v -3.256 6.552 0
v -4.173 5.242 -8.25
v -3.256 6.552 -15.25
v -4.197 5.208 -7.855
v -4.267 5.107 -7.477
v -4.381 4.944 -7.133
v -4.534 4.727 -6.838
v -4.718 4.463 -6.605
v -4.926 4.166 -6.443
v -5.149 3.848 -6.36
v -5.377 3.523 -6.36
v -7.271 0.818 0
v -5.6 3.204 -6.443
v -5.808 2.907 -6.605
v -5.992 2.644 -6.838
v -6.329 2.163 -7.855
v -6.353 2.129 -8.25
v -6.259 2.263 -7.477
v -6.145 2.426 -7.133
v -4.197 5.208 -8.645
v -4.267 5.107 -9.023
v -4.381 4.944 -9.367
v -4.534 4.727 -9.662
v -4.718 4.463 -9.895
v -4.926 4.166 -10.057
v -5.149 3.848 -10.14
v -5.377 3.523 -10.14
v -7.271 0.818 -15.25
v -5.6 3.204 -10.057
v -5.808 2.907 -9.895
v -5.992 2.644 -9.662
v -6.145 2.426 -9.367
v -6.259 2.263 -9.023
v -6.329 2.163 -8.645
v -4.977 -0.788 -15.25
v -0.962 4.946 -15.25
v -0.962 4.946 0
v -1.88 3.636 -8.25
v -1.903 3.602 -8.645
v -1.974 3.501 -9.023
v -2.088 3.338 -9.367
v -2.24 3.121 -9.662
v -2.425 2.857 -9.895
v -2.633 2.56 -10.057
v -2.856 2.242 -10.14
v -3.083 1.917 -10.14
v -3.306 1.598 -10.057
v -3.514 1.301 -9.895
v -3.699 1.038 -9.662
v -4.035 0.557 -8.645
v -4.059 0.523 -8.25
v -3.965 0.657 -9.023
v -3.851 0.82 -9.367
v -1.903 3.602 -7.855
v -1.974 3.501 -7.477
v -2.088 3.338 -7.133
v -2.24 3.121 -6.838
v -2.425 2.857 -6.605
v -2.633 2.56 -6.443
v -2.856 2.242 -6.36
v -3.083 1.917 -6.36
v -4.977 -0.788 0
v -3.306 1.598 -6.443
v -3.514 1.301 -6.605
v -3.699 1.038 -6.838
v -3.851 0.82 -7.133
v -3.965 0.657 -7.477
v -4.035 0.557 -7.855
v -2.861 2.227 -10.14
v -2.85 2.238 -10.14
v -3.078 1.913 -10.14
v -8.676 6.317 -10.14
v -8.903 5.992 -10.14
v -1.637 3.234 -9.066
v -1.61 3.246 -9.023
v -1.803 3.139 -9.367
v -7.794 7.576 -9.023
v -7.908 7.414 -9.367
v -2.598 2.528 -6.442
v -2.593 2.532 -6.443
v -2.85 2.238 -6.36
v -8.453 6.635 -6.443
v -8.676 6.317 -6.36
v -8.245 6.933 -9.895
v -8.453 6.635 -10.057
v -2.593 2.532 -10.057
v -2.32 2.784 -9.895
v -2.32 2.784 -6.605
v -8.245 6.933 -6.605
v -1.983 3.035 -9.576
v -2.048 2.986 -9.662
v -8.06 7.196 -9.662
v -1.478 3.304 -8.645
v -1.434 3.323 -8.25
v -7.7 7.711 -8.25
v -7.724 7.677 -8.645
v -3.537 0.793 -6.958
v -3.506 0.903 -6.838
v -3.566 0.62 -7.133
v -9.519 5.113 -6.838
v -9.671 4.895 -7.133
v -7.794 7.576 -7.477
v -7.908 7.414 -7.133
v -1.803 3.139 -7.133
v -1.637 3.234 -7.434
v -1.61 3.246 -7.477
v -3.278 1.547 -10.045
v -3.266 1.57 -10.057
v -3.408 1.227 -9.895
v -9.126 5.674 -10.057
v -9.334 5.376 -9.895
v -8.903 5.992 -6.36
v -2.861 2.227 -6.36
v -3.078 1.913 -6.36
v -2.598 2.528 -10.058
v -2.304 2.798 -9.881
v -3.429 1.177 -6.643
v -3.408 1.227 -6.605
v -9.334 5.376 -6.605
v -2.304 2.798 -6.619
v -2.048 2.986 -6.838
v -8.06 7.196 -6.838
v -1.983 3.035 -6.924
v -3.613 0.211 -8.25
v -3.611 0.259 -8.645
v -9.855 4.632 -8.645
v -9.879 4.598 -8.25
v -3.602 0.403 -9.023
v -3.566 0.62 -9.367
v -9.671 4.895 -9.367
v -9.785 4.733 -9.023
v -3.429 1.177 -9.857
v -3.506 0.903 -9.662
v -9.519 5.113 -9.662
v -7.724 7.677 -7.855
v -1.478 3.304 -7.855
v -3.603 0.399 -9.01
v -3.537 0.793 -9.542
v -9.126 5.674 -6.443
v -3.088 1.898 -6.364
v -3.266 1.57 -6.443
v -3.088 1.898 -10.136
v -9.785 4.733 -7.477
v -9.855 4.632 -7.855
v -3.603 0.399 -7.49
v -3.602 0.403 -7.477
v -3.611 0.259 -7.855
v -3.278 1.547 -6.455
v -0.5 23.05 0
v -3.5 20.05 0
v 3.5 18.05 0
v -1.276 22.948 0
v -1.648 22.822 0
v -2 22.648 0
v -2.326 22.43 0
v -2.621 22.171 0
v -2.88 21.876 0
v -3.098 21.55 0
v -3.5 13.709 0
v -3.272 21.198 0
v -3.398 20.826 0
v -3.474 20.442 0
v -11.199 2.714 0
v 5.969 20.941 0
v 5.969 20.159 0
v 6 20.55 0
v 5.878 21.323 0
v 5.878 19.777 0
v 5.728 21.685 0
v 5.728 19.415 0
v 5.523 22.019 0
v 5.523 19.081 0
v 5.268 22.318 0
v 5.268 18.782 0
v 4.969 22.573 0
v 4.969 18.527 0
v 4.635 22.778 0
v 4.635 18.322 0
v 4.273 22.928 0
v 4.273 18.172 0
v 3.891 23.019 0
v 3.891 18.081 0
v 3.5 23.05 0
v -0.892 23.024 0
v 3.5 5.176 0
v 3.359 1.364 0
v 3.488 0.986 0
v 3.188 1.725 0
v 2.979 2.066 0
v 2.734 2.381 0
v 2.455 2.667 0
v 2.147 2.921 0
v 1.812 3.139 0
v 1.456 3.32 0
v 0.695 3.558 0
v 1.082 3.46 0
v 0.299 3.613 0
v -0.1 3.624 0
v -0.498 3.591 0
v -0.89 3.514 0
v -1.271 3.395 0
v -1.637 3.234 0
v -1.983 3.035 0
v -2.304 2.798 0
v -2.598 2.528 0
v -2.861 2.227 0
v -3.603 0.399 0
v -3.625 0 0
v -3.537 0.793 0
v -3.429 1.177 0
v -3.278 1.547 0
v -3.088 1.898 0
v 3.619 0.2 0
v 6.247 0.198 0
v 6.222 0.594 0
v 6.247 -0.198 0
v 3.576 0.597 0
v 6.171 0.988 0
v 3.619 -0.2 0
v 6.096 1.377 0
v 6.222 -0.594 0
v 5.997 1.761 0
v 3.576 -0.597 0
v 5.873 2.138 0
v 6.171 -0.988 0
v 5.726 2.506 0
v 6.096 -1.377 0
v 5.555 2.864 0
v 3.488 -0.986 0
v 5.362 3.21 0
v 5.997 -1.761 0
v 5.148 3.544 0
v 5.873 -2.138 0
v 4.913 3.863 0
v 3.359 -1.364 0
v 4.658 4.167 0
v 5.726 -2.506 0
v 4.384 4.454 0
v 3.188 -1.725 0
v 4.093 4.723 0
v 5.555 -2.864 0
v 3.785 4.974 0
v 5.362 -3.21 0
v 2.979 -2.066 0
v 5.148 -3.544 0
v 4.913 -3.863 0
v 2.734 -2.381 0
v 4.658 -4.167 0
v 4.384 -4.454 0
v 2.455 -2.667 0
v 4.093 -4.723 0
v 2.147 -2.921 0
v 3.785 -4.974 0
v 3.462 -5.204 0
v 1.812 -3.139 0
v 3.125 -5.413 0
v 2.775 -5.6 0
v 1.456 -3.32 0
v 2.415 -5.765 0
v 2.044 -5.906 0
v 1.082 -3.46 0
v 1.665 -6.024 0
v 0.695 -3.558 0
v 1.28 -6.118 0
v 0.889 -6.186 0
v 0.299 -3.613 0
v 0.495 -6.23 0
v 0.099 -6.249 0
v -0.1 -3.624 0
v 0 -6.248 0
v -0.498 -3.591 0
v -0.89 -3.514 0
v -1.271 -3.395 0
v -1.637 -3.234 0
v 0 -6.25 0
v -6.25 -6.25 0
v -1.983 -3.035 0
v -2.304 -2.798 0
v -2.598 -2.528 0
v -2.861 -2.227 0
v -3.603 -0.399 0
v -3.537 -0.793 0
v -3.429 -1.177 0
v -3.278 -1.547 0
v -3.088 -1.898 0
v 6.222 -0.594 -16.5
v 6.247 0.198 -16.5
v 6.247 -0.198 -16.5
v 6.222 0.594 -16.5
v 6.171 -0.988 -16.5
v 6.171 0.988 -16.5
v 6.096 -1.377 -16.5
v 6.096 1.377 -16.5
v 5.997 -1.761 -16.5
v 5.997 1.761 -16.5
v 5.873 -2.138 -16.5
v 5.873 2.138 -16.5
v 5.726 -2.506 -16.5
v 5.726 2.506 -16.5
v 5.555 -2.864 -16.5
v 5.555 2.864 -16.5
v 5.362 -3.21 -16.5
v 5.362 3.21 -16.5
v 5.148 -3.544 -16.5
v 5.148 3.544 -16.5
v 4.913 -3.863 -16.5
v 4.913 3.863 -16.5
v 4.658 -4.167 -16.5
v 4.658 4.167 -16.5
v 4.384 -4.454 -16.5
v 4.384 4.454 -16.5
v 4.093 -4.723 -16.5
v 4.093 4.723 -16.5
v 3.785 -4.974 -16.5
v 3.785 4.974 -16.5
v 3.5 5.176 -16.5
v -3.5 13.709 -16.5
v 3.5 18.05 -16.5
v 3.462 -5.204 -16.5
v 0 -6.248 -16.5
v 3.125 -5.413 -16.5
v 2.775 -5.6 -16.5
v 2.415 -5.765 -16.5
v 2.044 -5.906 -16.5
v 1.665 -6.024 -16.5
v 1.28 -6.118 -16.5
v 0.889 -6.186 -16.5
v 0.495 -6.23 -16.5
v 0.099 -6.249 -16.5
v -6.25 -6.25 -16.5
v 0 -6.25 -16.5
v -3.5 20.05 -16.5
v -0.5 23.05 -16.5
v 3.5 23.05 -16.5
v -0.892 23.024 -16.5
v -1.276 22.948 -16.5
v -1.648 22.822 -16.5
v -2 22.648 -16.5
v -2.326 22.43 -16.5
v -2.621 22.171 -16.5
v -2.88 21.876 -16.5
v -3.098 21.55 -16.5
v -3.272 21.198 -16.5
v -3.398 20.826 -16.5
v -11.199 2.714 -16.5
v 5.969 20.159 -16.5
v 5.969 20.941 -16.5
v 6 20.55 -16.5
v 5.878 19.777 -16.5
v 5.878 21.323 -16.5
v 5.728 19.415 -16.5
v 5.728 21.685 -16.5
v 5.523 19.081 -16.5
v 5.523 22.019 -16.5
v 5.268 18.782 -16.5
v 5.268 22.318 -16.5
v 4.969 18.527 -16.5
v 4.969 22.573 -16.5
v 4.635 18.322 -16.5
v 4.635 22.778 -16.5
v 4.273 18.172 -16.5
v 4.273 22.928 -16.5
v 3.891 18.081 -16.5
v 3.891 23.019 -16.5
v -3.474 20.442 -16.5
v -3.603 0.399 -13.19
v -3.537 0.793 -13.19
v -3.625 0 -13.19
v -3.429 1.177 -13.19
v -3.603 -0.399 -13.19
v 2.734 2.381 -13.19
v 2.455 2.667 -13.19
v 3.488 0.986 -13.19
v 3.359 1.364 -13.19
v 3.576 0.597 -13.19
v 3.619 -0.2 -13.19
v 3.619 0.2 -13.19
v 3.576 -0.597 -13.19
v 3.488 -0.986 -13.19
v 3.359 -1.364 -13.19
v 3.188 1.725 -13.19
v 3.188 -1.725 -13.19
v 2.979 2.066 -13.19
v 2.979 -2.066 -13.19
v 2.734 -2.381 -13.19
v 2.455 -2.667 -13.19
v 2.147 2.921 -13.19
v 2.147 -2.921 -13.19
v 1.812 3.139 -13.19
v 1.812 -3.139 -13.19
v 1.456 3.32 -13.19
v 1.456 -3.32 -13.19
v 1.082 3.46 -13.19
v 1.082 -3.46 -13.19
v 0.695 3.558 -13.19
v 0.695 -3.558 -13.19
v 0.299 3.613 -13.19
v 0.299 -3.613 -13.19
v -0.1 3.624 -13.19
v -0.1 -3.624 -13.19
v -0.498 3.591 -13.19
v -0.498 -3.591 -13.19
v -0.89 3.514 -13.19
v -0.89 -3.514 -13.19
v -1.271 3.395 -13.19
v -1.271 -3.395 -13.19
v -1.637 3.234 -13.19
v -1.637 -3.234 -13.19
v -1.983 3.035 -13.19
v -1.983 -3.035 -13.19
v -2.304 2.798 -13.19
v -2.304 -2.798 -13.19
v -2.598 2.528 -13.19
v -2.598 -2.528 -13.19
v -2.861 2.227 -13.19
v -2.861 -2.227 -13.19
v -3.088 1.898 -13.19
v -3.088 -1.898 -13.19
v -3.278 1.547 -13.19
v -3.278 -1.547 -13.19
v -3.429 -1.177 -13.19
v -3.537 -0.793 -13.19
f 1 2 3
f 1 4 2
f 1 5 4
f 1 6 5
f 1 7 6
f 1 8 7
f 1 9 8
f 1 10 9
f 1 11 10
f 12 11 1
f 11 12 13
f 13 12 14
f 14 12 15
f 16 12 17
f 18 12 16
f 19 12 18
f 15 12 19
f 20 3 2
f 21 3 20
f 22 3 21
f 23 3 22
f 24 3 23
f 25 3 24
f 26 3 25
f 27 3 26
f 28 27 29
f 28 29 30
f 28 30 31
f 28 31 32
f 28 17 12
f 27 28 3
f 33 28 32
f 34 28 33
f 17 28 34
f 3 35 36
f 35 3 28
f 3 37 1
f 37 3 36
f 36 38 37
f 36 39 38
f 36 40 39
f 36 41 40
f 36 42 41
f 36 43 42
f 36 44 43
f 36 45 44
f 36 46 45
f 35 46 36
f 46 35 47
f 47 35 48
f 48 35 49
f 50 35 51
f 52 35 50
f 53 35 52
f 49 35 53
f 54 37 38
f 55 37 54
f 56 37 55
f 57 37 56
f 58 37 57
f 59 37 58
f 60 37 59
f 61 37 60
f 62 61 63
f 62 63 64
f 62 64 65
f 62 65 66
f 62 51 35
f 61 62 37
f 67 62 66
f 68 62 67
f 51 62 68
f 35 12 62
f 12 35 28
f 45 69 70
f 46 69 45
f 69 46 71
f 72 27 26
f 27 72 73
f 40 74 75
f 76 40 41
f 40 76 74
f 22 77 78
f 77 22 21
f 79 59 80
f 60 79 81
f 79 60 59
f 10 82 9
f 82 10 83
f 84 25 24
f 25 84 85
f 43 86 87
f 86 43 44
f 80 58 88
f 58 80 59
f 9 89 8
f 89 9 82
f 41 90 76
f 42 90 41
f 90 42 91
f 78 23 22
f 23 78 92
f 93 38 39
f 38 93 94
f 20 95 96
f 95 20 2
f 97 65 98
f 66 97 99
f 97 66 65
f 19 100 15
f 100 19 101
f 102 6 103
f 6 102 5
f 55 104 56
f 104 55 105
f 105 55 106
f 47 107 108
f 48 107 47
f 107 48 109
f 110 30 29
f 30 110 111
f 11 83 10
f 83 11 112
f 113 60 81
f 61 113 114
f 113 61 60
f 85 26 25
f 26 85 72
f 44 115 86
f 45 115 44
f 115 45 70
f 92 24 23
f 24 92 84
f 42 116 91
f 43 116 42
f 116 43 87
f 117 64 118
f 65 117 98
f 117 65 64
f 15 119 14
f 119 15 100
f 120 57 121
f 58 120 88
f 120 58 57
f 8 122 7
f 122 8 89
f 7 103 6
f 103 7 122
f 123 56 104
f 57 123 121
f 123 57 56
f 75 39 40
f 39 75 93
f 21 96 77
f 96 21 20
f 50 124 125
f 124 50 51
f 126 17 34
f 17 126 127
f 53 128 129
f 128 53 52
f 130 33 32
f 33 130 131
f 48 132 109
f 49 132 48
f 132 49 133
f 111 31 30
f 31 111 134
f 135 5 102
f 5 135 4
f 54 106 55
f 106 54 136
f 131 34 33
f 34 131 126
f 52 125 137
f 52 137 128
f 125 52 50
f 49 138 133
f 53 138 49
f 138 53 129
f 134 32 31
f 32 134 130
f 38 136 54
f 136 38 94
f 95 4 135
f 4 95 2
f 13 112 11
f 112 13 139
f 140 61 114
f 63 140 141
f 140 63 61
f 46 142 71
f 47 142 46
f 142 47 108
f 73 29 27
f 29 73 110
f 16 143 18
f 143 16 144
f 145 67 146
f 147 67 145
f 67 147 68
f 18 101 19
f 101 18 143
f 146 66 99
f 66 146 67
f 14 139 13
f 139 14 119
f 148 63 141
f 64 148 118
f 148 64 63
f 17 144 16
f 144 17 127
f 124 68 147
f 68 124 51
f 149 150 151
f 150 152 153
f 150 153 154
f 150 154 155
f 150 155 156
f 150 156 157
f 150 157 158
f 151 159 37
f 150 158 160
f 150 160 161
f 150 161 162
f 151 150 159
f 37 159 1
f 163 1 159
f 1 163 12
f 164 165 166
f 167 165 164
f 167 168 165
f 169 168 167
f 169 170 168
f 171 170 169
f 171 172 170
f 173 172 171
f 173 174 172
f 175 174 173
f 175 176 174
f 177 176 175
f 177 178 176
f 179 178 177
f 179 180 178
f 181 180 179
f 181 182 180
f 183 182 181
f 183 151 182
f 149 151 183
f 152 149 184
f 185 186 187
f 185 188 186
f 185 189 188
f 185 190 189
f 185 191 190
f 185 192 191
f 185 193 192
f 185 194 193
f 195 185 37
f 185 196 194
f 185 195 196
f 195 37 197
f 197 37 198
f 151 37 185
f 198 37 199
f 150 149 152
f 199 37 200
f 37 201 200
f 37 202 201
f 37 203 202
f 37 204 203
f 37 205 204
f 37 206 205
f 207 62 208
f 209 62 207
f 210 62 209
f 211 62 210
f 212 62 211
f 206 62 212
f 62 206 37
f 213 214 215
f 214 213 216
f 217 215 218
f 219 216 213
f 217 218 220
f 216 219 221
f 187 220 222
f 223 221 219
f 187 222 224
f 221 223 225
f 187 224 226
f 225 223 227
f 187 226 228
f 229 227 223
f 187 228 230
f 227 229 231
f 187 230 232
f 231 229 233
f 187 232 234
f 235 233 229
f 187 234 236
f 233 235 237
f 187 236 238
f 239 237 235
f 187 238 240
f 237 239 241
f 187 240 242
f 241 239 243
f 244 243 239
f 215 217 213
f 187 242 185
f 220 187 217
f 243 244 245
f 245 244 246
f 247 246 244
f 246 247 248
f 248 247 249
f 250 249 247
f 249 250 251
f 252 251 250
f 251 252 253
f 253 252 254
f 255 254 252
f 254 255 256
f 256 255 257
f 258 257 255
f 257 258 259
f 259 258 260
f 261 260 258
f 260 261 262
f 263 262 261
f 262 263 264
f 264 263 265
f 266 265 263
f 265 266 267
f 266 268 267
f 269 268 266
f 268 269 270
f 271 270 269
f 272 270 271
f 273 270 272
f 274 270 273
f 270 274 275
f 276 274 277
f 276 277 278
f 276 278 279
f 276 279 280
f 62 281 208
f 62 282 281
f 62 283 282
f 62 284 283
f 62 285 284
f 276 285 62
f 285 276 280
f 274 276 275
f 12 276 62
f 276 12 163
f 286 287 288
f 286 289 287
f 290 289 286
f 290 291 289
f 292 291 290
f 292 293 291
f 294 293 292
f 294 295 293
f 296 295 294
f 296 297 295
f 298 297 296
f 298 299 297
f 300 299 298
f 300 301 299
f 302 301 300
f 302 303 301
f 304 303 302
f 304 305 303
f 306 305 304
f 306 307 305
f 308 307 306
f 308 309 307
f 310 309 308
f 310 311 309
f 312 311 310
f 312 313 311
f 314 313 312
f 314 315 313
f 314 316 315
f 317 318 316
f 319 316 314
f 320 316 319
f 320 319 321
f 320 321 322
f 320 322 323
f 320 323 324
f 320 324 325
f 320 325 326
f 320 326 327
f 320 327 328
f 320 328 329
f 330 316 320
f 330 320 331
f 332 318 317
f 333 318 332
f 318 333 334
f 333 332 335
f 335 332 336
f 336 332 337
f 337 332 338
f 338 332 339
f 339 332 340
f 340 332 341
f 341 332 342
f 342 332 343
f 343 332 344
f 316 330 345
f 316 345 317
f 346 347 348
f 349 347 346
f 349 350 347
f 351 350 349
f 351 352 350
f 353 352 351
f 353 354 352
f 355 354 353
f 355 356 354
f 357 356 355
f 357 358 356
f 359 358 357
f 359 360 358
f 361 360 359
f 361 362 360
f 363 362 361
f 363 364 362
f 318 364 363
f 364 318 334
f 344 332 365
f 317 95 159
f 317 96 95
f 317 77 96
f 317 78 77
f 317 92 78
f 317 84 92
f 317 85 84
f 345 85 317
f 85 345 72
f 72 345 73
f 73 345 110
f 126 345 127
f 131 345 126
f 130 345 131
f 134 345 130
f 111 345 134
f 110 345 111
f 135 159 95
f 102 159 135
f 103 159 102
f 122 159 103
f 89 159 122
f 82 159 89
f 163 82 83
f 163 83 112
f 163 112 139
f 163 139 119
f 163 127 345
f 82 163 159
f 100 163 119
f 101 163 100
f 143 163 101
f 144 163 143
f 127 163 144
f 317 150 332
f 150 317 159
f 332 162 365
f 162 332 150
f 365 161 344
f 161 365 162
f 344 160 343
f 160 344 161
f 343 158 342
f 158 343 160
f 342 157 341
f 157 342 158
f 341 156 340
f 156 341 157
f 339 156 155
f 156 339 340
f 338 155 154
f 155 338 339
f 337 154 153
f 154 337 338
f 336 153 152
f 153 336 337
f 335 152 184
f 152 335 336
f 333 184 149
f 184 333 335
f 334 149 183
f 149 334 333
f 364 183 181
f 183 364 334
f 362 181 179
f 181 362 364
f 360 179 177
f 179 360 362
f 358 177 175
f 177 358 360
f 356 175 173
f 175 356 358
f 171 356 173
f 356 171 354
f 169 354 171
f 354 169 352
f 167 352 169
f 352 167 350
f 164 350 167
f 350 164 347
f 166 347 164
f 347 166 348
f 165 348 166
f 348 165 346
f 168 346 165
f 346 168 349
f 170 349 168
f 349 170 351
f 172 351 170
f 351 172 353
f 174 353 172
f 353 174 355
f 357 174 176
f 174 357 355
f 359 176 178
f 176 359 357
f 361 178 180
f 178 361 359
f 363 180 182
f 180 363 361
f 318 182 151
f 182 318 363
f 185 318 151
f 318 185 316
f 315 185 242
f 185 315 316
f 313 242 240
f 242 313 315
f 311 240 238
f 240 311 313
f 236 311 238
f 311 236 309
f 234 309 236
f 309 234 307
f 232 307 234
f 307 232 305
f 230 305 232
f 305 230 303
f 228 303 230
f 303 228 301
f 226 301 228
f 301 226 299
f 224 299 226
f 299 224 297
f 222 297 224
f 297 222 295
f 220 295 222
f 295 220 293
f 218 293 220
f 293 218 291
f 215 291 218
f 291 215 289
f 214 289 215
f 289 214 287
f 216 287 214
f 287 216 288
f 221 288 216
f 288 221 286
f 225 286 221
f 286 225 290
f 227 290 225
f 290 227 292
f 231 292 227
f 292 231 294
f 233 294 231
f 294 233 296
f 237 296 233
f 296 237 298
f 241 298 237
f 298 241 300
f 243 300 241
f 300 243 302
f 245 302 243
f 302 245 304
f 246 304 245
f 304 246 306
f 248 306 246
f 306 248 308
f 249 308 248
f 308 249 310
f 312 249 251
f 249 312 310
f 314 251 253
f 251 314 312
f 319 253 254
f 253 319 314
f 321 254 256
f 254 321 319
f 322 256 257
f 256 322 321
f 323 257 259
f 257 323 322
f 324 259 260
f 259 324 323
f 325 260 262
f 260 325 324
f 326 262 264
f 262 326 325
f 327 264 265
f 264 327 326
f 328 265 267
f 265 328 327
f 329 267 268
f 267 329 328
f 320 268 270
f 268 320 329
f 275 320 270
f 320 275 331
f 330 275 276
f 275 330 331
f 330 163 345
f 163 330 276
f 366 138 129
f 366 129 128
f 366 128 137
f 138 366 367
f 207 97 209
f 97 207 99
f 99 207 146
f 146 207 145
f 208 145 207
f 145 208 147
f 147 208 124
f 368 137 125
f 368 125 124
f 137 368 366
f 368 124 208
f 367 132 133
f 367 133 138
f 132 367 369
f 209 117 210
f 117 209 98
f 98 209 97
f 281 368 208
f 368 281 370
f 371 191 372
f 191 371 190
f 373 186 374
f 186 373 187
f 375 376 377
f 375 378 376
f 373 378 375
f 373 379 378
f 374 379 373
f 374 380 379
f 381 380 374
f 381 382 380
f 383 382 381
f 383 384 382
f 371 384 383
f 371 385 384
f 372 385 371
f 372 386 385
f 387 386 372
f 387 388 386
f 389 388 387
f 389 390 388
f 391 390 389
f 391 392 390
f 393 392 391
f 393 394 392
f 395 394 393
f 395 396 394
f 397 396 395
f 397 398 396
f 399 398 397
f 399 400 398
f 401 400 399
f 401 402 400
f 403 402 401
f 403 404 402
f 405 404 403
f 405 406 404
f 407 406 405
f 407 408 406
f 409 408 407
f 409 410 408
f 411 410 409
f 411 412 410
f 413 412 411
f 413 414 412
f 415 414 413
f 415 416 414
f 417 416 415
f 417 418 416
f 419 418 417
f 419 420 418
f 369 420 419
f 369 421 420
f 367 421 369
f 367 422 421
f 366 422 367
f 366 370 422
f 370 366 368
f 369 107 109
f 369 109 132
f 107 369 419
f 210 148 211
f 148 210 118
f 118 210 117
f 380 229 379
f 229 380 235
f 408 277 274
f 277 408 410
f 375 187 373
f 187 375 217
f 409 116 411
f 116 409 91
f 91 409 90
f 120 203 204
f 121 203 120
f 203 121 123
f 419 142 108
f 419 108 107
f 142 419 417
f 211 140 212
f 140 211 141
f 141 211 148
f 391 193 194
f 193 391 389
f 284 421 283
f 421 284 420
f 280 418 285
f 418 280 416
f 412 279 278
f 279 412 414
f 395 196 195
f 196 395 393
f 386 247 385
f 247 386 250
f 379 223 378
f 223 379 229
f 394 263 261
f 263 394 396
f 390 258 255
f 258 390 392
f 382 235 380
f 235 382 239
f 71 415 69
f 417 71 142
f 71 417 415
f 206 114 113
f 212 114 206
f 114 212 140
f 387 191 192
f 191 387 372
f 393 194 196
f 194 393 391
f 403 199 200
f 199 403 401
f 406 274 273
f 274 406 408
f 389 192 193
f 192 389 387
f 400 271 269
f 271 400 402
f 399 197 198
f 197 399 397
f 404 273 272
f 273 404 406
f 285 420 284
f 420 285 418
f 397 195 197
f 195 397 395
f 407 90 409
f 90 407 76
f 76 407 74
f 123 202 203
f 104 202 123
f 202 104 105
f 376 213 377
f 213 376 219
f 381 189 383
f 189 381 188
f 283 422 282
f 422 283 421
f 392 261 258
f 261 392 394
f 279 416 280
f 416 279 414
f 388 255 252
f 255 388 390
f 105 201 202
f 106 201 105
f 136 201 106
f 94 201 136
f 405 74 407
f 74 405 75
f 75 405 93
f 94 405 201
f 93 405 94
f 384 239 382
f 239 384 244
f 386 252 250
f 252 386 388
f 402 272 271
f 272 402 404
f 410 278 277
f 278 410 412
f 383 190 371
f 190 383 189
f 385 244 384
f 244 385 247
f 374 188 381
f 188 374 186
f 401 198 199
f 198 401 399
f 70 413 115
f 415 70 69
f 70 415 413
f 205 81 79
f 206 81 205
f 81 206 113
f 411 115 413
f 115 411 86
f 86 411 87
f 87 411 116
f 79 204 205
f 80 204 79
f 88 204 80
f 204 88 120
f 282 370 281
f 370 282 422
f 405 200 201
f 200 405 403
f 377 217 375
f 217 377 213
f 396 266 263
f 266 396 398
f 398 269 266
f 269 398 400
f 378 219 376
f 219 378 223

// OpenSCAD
$fa = 1;
$fs = 0.4;

diametro = 12.5;
radio1 = 3;
radio2 = 2.5;
largo = 29.3;
alto = 16.5;
ancho = 7;

d_vastago = 6.35 + .9;
a_vastago = 13.2;

d_tornillo = 3.8;
a_tornillo = 9;
l_tuerca = 7;
a_tuerca = 2.8;

alfa = 55;

//off = (diametro+d_vastago)/4;
off = d_vastago/2+a_tuerca/2;

module base () {
  circle(d=diametro);
  translate([-ancho/2,0,0]){  
    hull() {      
      square(ancho);
      translate([ancho-radio1,largo-radio1-diametro/2,0])
        circle(radio1);
      translate([0,largo-ancho/2-diametro/2,0])
        square(ancho/2);
    }
    translate([0,largo-radio2-diametro/2,0])
      circle(radio2);    
  }
  hull(){
    rotate([0,0,-alfa])
      translate([-l_tuerca*1.4,diametro/2-a_tuerca,0])
        square([2*l_tuerca,2.6*a_tuerca],center=false);
    translate([0,-diametro/2,0])
      square([diametro/2,diametro/2]);
  }
}

module tuerca(){
  difference(){
    cube([l_tuerca,l_tuerca,a_tuerca], center=true);
    translate([0,0,-a_tuerca])
      cylinder(h=3*a_tuerca,d=d_tornillo);
  }
}

module tornillo(){
  cylinder(h=a_tornillo,d=d_tornillo);
  translate([0,0,a_tornillo])
    difference(){
      sphere(r=d_tornillo);
      translate([0,0,-d_tornillo])
        cube(d_tornillo*2,center=true);
  }
}

module manija(){
  difference() {
    linear_extrude(alto) base();
    translate([0,0,-.01])
      cylinder(h=a_vastago, d=d_vastago);    
    for (s=[-1])
      rotate([0,0,s*alfa]) {
        // tuercas
        rotate([0,0,90])
          translate([off, 0, l_tuerca])
            rotate([0,90,0])
              cube([alto,l_tuerca,a_tuerca],center=true);
        // tornillos
        translate([0,0,alto/2])
          rotate([90,0,180])
            cylinder(h=diametro,d=d_tornillo);
      }
  }
}

//base();
rotate([0,180,0]) manija();
//rotate(180) completo();

//tornillo();

module completo () {
manija();
color("silver")
translate([0,0,-alto/3])
  for (s=[-1])
    rotate([0,0,s*alfa]) {
      // tuercas
//      rotate([0,0,90])
//        translate([off, 0, 0])
//          rotate([0,90,0])
//            tuerca();
      // tornillos
      translate([0,0,-10])
      #  rotate([90,0,180])
          translate([0,0,a_tornillo/2-a_tuerca/2])
          tornillo();
  }
}
